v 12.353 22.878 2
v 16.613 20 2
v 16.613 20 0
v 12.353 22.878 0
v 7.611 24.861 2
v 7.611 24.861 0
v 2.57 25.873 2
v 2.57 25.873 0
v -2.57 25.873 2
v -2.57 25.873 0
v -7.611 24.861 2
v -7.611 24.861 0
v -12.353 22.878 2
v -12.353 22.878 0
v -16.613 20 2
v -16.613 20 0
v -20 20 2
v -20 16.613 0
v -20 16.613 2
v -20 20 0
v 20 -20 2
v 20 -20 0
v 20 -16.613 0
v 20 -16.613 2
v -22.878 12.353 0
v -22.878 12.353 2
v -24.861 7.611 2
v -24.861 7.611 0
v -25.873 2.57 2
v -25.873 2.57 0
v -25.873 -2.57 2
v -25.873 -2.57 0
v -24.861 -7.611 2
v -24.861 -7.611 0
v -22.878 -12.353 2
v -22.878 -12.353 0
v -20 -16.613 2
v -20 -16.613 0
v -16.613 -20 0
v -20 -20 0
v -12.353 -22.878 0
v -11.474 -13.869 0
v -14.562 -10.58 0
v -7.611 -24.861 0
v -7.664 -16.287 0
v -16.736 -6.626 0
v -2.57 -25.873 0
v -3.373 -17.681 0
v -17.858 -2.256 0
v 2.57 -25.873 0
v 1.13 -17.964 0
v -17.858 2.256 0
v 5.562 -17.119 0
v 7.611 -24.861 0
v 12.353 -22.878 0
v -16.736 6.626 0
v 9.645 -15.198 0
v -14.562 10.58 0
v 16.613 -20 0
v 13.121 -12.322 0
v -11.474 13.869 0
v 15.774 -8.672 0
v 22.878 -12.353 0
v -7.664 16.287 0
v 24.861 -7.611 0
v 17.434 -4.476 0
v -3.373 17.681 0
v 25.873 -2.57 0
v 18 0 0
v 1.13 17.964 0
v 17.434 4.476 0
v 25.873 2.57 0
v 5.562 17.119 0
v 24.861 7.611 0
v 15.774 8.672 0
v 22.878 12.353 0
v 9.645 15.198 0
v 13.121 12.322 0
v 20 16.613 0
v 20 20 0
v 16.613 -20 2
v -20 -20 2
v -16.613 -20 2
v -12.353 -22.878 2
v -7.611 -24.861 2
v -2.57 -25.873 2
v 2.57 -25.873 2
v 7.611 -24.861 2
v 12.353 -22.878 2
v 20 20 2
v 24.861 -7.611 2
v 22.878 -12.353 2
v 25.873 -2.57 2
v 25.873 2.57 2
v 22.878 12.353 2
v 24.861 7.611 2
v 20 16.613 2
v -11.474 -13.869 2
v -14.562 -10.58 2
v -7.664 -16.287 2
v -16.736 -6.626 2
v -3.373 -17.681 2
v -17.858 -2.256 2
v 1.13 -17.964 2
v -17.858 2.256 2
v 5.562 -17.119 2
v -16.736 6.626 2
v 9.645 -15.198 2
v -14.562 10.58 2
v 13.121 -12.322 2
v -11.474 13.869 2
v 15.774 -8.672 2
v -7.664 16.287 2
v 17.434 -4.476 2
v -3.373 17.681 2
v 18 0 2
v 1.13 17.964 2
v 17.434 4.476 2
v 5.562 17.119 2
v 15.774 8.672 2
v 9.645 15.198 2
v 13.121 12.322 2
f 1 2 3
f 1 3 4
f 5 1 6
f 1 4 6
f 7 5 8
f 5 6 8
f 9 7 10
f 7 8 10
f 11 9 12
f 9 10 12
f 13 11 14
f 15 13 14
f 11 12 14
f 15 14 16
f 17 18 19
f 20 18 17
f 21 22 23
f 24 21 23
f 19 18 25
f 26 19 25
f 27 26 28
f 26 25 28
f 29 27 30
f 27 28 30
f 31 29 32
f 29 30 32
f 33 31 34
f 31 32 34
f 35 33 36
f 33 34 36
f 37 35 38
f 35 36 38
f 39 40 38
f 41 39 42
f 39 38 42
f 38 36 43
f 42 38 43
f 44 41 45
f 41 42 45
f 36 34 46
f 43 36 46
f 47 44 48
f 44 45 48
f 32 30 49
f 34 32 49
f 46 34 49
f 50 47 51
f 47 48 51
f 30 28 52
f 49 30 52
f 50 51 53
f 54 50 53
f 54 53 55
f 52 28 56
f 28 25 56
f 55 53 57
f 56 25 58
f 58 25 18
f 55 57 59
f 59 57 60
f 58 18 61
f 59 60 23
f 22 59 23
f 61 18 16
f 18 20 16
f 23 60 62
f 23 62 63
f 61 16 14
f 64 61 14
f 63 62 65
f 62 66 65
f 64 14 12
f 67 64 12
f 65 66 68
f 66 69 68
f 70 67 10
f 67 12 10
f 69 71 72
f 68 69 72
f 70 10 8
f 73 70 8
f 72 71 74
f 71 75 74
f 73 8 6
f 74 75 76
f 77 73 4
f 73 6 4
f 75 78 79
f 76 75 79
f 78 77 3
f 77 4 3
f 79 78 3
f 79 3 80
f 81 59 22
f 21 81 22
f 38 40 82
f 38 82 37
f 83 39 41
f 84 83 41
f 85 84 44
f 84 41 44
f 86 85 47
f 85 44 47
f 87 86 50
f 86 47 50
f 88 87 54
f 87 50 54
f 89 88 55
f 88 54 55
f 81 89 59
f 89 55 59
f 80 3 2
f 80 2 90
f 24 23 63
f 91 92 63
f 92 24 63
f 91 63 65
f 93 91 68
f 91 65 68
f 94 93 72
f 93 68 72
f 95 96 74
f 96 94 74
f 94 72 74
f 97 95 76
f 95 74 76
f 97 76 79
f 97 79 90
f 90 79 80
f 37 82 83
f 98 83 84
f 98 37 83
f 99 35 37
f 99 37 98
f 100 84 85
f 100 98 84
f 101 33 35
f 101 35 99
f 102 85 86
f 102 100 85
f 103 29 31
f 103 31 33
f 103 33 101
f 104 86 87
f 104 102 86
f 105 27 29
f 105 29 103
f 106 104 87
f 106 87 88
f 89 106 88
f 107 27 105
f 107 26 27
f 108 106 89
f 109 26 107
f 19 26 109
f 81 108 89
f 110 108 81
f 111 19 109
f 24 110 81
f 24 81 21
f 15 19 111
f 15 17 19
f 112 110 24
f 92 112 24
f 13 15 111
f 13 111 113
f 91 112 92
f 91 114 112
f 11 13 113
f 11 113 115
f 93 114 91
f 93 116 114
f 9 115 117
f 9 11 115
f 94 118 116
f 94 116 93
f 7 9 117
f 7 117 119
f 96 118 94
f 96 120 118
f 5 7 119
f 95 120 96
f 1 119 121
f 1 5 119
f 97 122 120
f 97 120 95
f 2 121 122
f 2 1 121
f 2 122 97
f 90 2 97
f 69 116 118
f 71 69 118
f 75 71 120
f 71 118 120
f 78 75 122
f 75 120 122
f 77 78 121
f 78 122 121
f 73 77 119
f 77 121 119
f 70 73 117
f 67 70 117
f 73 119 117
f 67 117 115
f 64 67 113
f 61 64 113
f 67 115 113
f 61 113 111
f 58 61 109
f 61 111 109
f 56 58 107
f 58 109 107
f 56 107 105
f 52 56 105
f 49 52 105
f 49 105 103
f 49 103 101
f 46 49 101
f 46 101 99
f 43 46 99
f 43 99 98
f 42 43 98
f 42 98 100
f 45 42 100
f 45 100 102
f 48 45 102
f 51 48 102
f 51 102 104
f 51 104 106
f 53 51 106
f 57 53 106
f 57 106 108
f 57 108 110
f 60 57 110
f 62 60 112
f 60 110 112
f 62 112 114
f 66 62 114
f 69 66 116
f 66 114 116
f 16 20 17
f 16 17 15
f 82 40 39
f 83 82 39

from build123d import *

# Parameters (mm, degrees)
F0_W     = 40
F0_H     = 40
F1_DEPTH = 2
F2_W     = 2
F2_H     = 40
F3_DEPTH = 2
F4_R     = 26
F5_DEPTH = 2
F6_R     = 18
F7_DEPTH = 25


with BuildPart() as f1:
    # F0 (on Top) → F1 (new body)
    with BuildSketch(Plane.XY):
        Rectangle(F0_W, F0_H)
    extrude(amount=F1_DEPTH)

    # F2 (on Top) → F3 (join)
    with BuildSketch(Plane.XY):
        with Locations((-15, 0)):
            Rectangle(F2_W, F2_H)
        with Locations((-11, 0)):
            Rectangle(F2_W, F2_H)
    extrude(amount=F3_DEPTH)

    # F4 (on Top) → F5 (join)
    with BuildSketch(Plane.XY):
        Circle(F4_R)
    extrude(amount=F5_DEPTH)

    # F6 (on face) → F7 (cut)
    with BuildSketch(Plane.XY.offset(2)):
        Circle(F6_R)
    extrude(amount=-F7_DEPTH, mode=Mode.SUBTRACT)


solid = f1.part
